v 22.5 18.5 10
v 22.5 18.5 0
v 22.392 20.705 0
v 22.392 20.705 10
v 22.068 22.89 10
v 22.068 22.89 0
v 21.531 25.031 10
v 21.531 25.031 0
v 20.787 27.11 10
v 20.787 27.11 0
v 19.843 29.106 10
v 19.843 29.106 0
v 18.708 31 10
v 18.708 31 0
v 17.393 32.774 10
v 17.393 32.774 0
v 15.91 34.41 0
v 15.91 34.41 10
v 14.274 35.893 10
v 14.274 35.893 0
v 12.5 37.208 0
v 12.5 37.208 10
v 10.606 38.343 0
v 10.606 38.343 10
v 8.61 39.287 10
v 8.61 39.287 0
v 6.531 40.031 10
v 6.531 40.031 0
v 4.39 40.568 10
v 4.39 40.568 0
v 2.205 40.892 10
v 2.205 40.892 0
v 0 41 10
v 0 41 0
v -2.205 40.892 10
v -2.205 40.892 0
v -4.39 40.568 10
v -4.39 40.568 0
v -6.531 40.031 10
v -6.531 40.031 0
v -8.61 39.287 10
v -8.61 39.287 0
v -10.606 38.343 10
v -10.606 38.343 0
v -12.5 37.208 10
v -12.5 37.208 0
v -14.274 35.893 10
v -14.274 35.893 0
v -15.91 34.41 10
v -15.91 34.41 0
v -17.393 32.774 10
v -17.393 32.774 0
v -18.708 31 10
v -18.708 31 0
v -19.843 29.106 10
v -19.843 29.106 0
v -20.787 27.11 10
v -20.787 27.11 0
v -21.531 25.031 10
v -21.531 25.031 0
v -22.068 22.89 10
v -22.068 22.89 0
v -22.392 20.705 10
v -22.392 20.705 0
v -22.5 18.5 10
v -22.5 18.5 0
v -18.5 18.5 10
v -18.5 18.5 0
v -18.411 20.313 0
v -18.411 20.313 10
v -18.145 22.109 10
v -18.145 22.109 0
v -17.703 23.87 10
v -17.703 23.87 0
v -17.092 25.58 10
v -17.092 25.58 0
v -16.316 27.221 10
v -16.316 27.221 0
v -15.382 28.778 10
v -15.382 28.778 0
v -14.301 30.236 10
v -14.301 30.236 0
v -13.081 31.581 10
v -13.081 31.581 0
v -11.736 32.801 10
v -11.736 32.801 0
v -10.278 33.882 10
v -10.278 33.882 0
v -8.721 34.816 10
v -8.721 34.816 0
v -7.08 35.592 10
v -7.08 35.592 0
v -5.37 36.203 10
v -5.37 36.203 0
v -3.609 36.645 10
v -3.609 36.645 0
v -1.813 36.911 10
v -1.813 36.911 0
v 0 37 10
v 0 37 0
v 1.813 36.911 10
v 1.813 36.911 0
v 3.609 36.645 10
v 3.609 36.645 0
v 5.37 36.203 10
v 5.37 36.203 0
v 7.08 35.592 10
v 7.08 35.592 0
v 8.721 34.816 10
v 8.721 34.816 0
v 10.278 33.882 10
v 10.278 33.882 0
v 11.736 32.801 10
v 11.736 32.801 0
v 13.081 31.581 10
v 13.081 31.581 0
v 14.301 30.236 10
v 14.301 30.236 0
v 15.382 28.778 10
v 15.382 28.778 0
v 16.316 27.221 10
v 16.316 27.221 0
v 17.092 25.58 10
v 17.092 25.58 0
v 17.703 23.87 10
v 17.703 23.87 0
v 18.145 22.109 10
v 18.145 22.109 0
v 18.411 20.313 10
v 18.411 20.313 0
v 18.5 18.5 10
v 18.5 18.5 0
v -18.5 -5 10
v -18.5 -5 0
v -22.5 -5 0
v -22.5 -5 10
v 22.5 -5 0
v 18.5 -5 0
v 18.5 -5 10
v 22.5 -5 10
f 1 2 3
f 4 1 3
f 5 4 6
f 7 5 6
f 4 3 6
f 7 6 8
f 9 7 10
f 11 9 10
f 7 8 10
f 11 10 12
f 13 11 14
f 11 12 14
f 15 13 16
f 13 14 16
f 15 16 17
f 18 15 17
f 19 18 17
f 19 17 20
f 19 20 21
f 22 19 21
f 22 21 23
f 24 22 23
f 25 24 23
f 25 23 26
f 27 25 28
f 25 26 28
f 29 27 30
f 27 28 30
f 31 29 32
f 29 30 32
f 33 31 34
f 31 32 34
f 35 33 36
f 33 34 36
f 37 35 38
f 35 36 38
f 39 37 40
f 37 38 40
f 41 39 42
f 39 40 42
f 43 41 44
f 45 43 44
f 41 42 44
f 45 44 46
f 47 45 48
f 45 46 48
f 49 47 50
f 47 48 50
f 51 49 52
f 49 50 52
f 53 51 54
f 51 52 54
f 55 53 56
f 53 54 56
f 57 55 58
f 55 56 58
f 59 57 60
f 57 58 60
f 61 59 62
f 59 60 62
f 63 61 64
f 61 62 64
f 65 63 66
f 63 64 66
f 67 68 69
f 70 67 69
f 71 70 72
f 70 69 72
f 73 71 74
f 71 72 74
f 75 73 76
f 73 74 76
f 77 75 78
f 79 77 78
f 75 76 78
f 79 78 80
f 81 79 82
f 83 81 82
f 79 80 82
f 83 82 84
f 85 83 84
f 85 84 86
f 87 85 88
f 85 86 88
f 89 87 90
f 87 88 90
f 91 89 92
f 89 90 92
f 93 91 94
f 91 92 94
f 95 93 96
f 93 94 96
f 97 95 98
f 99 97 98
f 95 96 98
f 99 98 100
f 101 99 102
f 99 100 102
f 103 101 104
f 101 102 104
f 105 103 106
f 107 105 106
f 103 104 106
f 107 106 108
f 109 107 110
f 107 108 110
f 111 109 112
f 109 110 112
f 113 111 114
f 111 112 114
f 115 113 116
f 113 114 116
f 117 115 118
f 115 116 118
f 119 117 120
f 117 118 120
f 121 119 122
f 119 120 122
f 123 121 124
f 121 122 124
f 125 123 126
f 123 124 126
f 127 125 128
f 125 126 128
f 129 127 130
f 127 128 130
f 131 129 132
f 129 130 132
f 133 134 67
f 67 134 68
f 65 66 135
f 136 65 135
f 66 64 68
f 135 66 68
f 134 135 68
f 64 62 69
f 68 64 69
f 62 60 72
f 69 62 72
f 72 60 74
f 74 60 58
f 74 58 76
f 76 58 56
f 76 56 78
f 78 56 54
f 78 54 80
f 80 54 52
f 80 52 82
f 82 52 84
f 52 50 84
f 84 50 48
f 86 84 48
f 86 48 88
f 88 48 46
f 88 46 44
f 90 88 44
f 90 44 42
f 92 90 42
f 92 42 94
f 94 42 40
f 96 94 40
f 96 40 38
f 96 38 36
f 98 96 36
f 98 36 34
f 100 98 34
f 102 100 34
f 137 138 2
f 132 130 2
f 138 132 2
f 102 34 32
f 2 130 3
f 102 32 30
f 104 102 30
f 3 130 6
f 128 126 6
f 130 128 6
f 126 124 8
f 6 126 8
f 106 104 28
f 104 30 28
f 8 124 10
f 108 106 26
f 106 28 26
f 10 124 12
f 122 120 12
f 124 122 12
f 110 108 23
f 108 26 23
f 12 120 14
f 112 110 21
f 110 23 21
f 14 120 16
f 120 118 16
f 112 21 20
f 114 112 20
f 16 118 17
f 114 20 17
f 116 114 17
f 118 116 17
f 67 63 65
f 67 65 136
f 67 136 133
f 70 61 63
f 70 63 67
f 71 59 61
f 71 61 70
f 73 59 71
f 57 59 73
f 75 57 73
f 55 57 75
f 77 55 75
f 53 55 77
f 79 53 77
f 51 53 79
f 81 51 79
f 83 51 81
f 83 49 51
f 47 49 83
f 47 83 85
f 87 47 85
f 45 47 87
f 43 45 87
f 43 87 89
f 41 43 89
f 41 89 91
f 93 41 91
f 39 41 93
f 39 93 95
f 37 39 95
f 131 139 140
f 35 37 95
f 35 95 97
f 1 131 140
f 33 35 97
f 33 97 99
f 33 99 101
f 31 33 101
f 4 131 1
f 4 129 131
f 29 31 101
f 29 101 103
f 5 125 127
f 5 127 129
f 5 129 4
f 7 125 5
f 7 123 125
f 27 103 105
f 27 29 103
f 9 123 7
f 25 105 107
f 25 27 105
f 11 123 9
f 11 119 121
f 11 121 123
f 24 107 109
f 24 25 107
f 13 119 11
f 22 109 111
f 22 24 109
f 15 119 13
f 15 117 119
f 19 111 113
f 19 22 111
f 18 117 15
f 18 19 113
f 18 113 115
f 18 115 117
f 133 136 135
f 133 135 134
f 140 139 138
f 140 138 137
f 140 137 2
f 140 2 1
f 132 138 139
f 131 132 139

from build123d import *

# Parameters (mm, degrees)
BOSS_EXTRUDE1_DEPTH = 10
SKETCH2_W           = 4
SKETCH2_H           = 10
BOSS_EXTRUDE2_DEPTH = 5


with BuildPart() as part:
    # Sketch1 → Boss-Extrude1 (new body)
    with BuildSketch(Plane.XY):
        with BuildLine():
            Line((18.5, 18.5), (18.5, 0))
            Line((18.5, 0), (22.5, 0))
            Line((22.5, 0), (22.5, 18.5))
            ThreePointArc((22.5, 18.5), (0, 41), (-22.5, 18.5))
            Line((-22.5, 18.5), (-22.5, 0))
            Line((-22.5, 0), (-18.5, 0))
            Line((-18.5, 0), (-18.5, 18.5))
            ThreePointArc((-18.5, 18.5), (0, 37), (18.5, 18.5))
        make_face()
    extrude(amount=BOSS_EXTRUDE1_DEPTH)

    # Sketch2 → Boss-Extrude2 (add)
    with BuildSketch(Plane.XZ):
        with Locations((20.5, 5)):
            Rectangle(SKETCH2_W, SKETCH2_H)
        with Locations((-20.5, 5)):
            Rectangle(SKETCH2_W, SKETCH2_H)
    extrude(amount=BOSS_EXTRUDE2_DEPTH)


solid = part.part
